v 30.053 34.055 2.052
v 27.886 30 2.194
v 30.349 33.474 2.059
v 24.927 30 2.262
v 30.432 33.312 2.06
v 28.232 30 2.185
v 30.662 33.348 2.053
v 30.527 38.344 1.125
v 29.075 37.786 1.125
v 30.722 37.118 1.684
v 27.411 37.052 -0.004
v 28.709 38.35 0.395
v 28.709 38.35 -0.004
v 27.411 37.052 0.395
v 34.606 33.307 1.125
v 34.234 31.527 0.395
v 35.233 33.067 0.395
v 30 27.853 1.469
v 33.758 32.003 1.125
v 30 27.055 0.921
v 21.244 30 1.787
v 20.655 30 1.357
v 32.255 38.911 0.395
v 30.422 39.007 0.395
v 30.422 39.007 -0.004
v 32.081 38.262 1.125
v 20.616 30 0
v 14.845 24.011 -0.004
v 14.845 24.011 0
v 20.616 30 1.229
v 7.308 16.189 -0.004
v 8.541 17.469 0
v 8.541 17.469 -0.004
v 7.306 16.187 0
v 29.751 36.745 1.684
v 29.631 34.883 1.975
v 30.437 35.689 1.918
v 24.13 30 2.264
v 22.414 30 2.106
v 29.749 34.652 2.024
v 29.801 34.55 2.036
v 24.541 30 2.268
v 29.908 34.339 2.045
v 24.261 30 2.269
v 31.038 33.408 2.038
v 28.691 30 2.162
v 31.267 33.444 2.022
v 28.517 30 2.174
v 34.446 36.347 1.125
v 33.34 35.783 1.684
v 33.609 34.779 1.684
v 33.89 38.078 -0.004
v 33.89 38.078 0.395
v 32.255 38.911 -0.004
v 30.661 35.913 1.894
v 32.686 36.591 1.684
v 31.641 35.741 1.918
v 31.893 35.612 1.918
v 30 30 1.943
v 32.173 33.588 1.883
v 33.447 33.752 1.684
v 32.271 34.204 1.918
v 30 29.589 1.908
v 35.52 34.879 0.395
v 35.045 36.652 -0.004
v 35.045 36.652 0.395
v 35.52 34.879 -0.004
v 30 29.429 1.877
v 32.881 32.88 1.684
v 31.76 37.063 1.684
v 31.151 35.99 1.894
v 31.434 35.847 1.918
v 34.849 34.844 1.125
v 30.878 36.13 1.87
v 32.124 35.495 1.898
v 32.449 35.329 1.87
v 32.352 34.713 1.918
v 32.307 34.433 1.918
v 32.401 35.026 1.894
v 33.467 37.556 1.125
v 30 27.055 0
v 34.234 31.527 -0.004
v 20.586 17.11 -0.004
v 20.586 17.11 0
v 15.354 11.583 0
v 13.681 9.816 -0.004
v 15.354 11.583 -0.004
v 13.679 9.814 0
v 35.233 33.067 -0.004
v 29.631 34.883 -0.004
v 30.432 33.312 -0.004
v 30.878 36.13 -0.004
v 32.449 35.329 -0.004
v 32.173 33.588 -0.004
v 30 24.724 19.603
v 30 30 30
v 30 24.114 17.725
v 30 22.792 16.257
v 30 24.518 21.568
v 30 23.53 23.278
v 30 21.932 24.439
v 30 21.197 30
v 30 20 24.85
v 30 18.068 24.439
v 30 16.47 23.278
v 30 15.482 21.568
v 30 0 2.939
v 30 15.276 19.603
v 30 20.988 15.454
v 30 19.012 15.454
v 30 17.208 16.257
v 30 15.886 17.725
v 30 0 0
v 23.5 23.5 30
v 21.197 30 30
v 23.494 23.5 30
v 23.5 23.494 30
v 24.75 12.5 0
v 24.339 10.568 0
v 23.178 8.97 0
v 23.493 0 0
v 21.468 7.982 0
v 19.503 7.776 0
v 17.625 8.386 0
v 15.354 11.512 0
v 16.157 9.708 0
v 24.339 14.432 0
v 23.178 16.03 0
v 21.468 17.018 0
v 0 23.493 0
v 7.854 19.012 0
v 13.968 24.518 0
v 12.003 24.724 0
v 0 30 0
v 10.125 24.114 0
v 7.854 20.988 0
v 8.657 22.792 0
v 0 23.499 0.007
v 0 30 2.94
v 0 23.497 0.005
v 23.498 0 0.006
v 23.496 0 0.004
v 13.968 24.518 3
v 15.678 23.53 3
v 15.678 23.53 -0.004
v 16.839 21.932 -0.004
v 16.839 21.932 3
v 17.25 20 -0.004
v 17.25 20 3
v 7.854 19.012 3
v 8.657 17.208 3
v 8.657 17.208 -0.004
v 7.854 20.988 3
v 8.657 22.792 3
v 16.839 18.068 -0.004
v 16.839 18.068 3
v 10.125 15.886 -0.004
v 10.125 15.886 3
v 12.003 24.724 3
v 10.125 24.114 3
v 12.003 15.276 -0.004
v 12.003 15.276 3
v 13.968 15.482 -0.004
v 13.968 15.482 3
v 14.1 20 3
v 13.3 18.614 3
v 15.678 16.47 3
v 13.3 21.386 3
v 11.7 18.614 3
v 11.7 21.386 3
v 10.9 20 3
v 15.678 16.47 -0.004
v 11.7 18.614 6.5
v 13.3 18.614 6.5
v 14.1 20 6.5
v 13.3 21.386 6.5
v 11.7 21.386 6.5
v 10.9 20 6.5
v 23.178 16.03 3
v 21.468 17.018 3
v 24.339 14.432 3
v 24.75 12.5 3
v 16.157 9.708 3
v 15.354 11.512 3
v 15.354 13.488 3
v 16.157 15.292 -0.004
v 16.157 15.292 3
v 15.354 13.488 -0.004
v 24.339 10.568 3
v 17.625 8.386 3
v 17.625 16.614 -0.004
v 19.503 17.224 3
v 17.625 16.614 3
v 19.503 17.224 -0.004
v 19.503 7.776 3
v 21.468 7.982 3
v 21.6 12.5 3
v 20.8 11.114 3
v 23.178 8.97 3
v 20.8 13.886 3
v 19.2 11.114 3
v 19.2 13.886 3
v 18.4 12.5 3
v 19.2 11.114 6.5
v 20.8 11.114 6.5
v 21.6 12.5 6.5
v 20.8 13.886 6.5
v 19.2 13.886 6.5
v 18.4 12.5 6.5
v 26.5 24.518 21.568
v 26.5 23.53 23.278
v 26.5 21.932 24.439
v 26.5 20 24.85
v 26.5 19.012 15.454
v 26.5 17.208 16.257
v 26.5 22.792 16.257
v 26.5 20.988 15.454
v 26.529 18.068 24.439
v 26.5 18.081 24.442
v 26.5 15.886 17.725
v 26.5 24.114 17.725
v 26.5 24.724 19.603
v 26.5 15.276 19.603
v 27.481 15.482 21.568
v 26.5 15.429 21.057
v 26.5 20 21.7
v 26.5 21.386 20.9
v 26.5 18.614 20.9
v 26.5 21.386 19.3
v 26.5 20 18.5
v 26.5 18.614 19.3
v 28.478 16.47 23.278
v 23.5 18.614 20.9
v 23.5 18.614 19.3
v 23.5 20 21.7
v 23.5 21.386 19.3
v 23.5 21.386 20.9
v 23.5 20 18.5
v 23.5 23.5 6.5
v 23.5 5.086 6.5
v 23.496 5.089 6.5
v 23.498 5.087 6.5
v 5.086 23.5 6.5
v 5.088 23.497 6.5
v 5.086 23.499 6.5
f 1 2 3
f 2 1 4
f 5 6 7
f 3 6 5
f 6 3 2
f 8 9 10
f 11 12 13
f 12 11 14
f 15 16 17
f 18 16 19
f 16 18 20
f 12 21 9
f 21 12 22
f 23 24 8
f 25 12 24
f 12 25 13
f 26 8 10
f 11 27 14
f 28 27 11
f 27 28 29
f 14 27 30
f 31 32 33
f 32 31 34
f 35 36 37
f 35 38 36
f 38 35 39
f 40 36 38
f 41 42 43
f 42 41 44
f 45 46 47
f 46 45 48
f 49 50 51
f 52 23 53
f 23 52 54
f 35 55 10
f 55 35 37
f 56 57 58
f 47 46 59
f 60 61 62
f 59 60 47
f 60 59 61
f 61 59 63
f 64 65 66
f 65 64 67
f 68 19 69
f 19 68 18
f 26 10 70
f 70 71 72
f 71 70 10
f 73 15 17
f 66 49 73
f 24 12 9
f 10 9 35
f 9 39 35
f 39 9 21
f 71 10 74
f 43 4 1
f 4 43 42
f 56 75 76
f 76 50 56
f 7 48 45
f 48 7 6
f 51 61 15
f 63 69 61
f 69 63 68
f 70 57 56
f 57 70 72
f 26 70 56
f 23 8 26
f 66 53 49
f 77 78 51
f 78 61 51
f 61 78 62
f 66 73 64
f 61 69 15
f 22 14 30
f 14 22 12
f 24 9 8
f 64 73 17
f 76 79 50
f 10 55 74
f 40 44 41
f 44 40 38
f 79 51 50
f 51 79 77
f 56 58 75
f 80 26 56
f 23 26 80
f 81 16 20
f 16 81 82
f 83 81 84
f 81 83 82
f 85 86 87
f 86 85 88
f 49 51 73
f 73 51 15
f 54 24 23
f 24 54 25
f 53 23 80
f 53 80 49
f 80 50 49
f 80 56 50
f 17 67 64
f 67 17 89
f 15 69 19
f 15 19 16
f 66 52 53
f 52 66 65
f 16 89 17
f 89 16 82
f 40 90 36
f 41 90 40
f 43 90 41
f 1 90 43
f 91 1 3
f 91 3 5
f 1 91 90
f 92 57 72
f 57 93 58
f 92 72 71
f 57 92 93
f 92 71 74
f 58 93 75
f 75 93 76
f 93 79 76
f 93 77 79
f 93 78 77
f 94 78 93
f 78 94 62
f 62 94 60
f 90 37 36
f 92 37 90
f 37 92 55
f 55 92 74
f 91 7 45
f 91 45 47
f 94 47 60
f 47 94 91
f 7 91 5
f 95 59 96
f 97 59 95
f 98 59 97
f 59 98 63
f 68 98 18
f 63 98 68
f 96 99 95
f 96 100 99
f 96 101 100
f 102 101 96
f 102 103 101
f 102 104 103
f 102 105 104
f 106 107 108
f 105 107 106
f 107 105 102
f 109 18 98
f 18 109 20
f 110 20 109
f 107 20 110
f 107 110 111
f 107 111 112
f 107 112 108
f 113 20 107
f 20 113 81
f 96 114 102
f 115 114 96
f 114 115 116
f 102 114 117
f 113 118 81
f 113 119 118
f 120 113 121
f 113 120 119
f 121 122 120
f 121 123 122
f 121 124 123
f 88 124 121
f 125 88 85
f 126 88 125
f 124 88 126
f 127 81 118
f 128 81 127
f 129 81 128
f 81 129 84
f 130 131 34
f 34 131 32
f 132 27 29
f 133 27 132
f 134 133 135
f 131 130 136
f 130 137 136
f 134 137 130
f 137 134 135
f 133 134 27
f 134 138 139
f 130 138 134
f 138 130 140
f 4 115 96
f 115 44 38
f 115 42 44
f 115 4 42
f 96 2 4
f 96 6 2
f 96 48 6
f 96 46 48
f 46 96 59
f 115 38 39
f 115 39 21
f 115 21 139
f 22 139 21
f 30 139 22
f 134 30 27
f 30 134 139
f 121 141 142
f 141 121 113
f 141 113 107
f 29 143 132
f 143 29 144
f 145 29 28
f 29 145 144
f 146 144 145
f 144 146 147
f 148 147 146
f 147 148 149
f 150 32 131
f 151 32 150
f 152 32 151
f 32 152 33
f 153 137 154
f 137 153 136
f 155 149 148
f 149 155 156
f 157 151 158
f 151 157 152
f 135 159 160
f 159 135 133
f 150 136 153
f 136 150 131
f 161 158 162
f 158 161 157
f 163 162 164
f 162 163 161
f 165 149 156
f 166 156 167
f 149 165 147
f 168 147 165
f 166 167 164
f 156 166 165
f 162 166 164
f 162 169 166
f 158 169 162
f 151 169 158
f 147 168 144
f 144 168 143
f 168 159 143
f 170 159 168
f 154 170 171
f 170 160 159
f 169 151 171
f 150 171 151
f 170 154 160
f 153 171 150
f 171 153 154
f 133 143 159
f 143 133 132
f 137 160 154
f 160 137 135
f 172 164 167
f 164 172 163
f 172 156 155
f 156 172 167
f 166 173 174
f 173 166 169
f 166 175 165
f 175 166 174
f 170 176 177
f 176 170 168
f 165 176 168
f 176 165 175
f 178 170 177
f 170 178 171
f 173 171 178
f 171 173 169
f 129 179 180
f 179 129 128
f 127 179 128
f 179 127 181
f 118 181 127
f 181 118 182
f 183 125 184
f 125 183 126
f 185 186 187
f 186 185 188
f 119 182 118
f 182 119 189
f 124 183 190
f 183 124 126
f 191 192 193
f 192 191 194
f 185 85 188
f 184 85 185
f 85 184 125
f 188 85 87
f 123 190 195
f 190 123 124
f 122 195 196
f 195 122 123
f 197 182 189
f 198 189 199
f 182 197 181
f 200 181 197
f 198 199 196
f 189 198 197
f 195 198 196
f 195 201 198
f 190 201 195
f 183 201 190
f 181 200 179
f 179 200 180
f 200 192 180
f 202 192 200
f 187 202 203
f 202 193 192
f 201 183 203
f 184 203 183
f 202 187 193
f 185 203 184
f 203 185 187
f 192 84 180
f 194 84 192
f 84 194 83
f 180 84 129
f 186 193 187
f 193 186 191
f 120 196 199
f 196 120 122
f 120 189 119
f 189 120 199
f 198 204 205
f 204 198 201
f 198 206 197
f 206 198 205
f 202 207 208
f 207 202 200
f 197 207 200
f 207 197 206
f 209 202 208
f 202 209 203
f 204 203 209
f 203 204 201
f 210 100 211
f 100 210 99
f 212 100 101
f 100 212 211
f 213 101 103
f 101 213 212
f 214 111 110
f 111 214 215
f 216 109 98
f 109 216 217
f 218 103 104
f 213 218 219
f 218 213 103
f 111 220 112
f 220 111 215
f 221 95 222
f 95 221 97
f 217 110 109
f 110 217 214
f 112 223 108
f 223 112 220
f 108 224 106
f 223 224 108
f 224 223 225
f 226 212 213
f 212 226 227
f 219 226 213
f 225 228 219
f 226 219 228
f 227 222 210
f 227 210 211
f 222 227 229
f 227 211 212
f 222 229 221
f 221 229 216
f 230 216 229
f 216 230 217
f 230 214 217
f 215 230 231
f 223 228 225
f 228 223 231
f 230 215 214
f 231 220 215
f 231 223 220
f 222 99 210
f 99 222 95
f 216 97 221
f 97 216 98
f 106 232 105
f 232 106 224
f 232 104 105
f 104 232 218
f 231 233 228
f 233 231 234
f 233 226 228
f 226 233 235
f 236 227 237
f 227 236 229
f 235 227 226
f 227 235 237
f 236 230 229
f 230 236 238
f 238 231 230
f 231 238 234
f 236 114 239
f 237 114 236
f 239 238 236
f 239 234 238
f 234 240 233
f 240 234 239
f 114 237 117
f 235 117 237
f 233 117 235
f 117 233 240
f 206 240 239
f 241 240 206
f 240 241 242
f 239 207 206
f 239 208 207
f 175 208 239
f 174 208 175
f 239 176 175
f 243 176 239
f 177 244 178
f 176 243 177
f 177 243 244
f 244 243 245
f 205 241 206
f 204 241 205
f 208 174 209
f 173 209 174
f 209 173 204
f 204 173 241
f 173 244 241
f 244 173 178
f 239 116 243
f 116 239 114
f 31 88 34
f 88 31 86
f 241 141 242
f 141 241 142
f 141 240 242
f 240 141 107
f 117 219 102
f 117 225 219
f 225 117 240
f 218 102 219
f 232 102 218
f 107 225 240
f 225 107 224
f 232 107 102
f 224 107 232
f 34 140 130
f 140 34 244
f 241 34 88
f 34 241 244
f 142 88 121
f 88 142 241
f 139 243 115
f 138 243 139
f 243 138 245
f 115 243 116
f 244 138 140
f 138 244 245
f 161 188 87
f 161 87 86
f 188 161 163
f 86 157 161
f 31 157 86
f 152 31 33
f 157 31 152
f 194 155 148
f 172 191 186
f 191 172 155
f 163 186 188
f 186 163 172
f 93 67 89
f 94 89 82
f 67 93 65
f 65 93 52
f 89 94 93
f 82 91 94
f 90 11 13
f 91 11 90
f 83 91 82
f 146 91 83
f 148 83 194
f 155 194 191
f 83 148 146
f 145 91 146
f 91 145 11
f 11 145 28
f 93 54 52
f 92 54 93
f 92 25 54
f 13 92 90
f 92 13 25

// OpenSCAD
// file: parameters.scad
// #################################################################
// Global Parameters
// on another rod
// #################################################################

// GENERAL SETTINGS
// use fnLargeDiameter for objects needing more vertices for smoothness, small for boltType1s etc.
fnLargeDiameter = 40;
fnSmallDiameter = 30;
wallThicknessMin = 3; // Used for all thicknesses from part to outside, or part to part

// NON-PRINTED PARTS MEASUREMENTS

// slideRod is an outside rod that the carriages are riding on, connected to the drive
slideRodLength = 500;
slideRodDiameter = 8;

// crossRod is an inside rod that the center piece rides on
crossRodLength = 500;  // TODO define calculation to derive from slideRod dims.
crossRodDiameter = 8;

// drive belt
beltWidth = 6;
beltThickness = 1.5;

// slideCarriage rides on the outside slide rods
slideCarriageLength = 80;
slideCarriageSocketDepthMin = 20;
slideCarriageSplitWidth = 1; // How much room left for clamping force between the slide and the rod

// EndSupport attaches to the outside wall and holds the stationary slide rods and pulleys
endSupportRodInsertionDepth = 30;

// Motor Side Pulleys
motorSidePulleyBearingInsideDiameter = 4; // The hole in the bearing
motorSidePulleyBearingInsideDiameter2 = 6; // The diameter of the center ring on which to hold the bearing
motorSidePulleyBearingOutsideDiameter = 13; // The diameter of the outside of the bearing

motorSidePulleyBeltPathDiameter = motorSidePulleyBearingOutsideDiameter+4; // Where the belt rides
motorSidePulleyBeltPathWidth = beltWidth+1; // Where the belt rides
edgeWallThickness = 2;
motorSidePulleyEdgeDiameter = motorSidePulleyBeltPathDiameter+beltThickness*2; // The Max Diameter including the ridges that guide the belt in
motorSidePulleyTotalThickness = motorSidePulleyBeltPathWidth+edgeWallThickness*2; // Adds thickness for the edges
motorSidePulleyBeltClearance = 3; // Extra space around pulley circumference
motorSidePulleySideClearance = 0.5; // Space of pulley set off from bracket
motorSidePulleyMountTotalThickness = wallThicknessMin*3;
mountingScrewHoleDiameter = 3;
mountingScrewHeadDiameter = 6;
mountingPlateX = motorSidePulleyMountTotalThickness + mountingScrewHeadDiameter*2 + 1; // Left/right size of plate
mountingPlateY = motorSidePulleyMountTotalThickness + mountingScrewHeadDiameter*2 + 1 +motorSidePulleyEdgeDiameter; // Up/down size of plate
mountingPlateZ = 3; // Mounting plate thickness

// gantry rides at the intersection of the crossRods
gantryXLength = 100;
gantryYLength = 100;
// Measured gap between crossRods
gantryGap = 15; 
// mounting cutout on the gantry minimum size,
mountPlateXLength = 30;
mountPlateYLength = 30;
mountPlateZLength = 10;
//Fillet/roundover radius for the gantry
gantryFillet = 3;

teflonTapeThickness = 0.1; // The tape used inside the slides to reduce friction on the slides

// Parameters specific to outer housing corners

boardThickness = 17; // thickness of boards used for all sides
screwLength = 30; // screw length less head, used for holes
screwThreadDiameter = 3; // Outer diameter of thread, used for hole sizing
screwHeadDiameter = 9.3; // Diameter of screw head, used for countersinking
screwHeadDepth = 3.5; // Depth of countersinking
minStructuralThickness = 3; // Plastic min depth, from bottom of countersink to end of that wall
cornerSize = 30; // overall cube size for corner
tabSize = 20; // how far out the tab sticks
tabScrewDiameter = 5; // size of hole in tab
mooringHoleDiameter = 3; // Diameter of hole for attaching to a surface



// Bolt Type 1 is used for clamping the larger parts, like the slide carriage together.
// Measurements for exact bolt dimensions.
boltType1HeadDiameter = 5.35;
boltType1HeadLength = 2.9;
boltType1ShaftDiameter = 2.9;
boltType1ShaftLength = 6;
boltType1ThreadDiameter = 2.95;
boltType1ThreadLength = 8;
totalBoltLength = boltType1HeadLength+boltType1ShaftLength+boltType1ThreadLength;

// The voids left for bolts in parts
boltType1HeadHoleDiameter = boltType1HeadDiameter*1.1; // Room to fit
boltType1HeadHoleLength = boltType1HeadLength*4; // To cut out area above the hole if needed
boltType1ShaftHoleDiameter = boltType1ShaftDiameter+0.4; // To allow slippage so clamping works
boltType1ShaftHoleLength = boltType1ShaftLength;
boltType1ThreadHoleDiameter = boltType1ThreadDiameter-0.2; // To provide grab. Will need fit testing for printer
boltType1ThreadHoleLength = boltType1ThreadLength;
// main file
include <parameters.scad>
// use of 2 bounding boxes made to cut 45 and eliminate extra "tab" length

//boardThickness // thickness of boards used for all sides
//screwThreadDiameter // Diameter of thread, used for hole sizing
//screwLength
//screwHeadDiameter // Diameter of screw head, used for countersinking
//screwHeadDepth // Depth of countersinking
//minStructuralThickness // Plastic min depth
//cornerSize // overall cube size for corner
//tabSize // how far out the tab sticks
//tabScrewDiameter // size of hole in tab
//mooringHoleDiameter



Body();

module Body(){

//un-comment for visual fasterner reference
    
/*    
translate([cornerSize/2.4,cornerSize/3,minStructuralThickness]) rotate([0,0,0]) CountersinkDrilling();
translate([cornerSize-screwHeadDepth,cornerSize/2.4,minStructuralThickness]) rotate([0,0,0]) CountersinkDrilling();
translate([cornerSize-cornerSize/3,cornerSize-screwHeadDepth,cornerSize*0.53]) rotate([90,0,0]) CountersinkDrilling();
translate([cornerSize-screwHeadDepth,cornerSize-cornerSize/3,cornerSize*0.67]) rotate([0,-90,0]) CountersinkDrilling();    
*/ 



intersection(){
    difference(){
    union(){
        cube(cornerSize,center = false);
         rotate([0,0,-45]) translate([-(mooringHoleDiameter + 2*minStructuralThickness+screwHeadDepth)/2,cornerSize/2,0]) {Tab();};
        };

translate([-minStructuralThickness-screwHeadDepth,-minStructuralThickness-screwHeadDepth,minStructuralThickness+screwHeadDepth]) cube(cornerSize, center = false); 
        //drill holes
translate([cornerSize/2.4,cornerSize-cornerSize/3,minStructuralThickness]) rotate([0,0,0]) CountersinkDrilling();
translate([cornerSize-cornerSize/3,cornerSize/2.4,minStructuralThickness]) rotate([0,0,0]) CountersinkDrilling();
//translate([cornerSize-cornerSize/3,cornerSize-screwHeadDepth,cornerSize*0.53]) rotate([90,0,0]) CountersinkDrilling();
translate([cornerSize-screwHeadDepth,cornerSize-cornerSize/3,cornerSize*0.67]) rotate([0,-90,0]) CountersinkDrilling();    
        
        
        
         };  

        hull(){
        translate([cornerSize-minStructuralThickness-screwHeadDepth,0,0]) sphere(r=.005, center=true);
            translate([cornerSize,0,0]) sphere(r=.005, center=true);
        translate([cornerSize-minStructuralThickness-screwHeadDepth, cornerSize-minStructuralThickness-screwHeadDepth, cornerSize]) sphere(r=.005, center=true);
        translate([0,cornerSize-minStructuralThickness-screwHeadDepth,0]) sphere(r=.005, center=true);
            translate([0,cornerSize,0]) sphere(r=.005, center=true);
        translate([3*cornerSize,0,0]) sphere(r=.005, center=true);
        translate([3*cornerSize,0,cornerSize]) sphere(r=.005, center=true);
        translate([3*cornerSize, 3*cornerSize, cornerSize]) sphere(r=.005, center=true);
         translate([3*cornerSize, 3*cornerSize, 0]) sphere(r=.005, center=true);
        translate([0,3*cornerSize,0]) sphere(r=.005, center=true);
        translate([0,3*cornerSize,cornerSize]) sphere(r=.005, center=true);
        
};
};
}
module Tab(){  
    difference(){
        hull(){
        cube([mooringHoleDiameter + 2*minStructuralThickness,1,minStructuralThickness], center = false);
           translate([mooringHoleDiameter/4+minStructuralThickness,cornerSize+mooringHoleDiameter/2,0]) scale([1,1,.45]) sphere(r=mooringHoleDiameter/2+minStructuralThickness, center=false);
        };
    translate([mooringHoleDiameter/4+minStructuralThickness,cornerSize+mooringHoleDiameter/2,-1]) cylinder(h=3*mooringHoleDiameter, d=mooringHoleDiameter, center=false);
    };
}

module CountersinkDrilling() {
     translate([0,0,-screwHeadDepth-3]) cylinder(h=screwHeadDepth+3, d=screwHeadDiameter+0.2, center = false);
        cylinder(d=screwThreadDiameter+0.2, h=screwLength);   
}
